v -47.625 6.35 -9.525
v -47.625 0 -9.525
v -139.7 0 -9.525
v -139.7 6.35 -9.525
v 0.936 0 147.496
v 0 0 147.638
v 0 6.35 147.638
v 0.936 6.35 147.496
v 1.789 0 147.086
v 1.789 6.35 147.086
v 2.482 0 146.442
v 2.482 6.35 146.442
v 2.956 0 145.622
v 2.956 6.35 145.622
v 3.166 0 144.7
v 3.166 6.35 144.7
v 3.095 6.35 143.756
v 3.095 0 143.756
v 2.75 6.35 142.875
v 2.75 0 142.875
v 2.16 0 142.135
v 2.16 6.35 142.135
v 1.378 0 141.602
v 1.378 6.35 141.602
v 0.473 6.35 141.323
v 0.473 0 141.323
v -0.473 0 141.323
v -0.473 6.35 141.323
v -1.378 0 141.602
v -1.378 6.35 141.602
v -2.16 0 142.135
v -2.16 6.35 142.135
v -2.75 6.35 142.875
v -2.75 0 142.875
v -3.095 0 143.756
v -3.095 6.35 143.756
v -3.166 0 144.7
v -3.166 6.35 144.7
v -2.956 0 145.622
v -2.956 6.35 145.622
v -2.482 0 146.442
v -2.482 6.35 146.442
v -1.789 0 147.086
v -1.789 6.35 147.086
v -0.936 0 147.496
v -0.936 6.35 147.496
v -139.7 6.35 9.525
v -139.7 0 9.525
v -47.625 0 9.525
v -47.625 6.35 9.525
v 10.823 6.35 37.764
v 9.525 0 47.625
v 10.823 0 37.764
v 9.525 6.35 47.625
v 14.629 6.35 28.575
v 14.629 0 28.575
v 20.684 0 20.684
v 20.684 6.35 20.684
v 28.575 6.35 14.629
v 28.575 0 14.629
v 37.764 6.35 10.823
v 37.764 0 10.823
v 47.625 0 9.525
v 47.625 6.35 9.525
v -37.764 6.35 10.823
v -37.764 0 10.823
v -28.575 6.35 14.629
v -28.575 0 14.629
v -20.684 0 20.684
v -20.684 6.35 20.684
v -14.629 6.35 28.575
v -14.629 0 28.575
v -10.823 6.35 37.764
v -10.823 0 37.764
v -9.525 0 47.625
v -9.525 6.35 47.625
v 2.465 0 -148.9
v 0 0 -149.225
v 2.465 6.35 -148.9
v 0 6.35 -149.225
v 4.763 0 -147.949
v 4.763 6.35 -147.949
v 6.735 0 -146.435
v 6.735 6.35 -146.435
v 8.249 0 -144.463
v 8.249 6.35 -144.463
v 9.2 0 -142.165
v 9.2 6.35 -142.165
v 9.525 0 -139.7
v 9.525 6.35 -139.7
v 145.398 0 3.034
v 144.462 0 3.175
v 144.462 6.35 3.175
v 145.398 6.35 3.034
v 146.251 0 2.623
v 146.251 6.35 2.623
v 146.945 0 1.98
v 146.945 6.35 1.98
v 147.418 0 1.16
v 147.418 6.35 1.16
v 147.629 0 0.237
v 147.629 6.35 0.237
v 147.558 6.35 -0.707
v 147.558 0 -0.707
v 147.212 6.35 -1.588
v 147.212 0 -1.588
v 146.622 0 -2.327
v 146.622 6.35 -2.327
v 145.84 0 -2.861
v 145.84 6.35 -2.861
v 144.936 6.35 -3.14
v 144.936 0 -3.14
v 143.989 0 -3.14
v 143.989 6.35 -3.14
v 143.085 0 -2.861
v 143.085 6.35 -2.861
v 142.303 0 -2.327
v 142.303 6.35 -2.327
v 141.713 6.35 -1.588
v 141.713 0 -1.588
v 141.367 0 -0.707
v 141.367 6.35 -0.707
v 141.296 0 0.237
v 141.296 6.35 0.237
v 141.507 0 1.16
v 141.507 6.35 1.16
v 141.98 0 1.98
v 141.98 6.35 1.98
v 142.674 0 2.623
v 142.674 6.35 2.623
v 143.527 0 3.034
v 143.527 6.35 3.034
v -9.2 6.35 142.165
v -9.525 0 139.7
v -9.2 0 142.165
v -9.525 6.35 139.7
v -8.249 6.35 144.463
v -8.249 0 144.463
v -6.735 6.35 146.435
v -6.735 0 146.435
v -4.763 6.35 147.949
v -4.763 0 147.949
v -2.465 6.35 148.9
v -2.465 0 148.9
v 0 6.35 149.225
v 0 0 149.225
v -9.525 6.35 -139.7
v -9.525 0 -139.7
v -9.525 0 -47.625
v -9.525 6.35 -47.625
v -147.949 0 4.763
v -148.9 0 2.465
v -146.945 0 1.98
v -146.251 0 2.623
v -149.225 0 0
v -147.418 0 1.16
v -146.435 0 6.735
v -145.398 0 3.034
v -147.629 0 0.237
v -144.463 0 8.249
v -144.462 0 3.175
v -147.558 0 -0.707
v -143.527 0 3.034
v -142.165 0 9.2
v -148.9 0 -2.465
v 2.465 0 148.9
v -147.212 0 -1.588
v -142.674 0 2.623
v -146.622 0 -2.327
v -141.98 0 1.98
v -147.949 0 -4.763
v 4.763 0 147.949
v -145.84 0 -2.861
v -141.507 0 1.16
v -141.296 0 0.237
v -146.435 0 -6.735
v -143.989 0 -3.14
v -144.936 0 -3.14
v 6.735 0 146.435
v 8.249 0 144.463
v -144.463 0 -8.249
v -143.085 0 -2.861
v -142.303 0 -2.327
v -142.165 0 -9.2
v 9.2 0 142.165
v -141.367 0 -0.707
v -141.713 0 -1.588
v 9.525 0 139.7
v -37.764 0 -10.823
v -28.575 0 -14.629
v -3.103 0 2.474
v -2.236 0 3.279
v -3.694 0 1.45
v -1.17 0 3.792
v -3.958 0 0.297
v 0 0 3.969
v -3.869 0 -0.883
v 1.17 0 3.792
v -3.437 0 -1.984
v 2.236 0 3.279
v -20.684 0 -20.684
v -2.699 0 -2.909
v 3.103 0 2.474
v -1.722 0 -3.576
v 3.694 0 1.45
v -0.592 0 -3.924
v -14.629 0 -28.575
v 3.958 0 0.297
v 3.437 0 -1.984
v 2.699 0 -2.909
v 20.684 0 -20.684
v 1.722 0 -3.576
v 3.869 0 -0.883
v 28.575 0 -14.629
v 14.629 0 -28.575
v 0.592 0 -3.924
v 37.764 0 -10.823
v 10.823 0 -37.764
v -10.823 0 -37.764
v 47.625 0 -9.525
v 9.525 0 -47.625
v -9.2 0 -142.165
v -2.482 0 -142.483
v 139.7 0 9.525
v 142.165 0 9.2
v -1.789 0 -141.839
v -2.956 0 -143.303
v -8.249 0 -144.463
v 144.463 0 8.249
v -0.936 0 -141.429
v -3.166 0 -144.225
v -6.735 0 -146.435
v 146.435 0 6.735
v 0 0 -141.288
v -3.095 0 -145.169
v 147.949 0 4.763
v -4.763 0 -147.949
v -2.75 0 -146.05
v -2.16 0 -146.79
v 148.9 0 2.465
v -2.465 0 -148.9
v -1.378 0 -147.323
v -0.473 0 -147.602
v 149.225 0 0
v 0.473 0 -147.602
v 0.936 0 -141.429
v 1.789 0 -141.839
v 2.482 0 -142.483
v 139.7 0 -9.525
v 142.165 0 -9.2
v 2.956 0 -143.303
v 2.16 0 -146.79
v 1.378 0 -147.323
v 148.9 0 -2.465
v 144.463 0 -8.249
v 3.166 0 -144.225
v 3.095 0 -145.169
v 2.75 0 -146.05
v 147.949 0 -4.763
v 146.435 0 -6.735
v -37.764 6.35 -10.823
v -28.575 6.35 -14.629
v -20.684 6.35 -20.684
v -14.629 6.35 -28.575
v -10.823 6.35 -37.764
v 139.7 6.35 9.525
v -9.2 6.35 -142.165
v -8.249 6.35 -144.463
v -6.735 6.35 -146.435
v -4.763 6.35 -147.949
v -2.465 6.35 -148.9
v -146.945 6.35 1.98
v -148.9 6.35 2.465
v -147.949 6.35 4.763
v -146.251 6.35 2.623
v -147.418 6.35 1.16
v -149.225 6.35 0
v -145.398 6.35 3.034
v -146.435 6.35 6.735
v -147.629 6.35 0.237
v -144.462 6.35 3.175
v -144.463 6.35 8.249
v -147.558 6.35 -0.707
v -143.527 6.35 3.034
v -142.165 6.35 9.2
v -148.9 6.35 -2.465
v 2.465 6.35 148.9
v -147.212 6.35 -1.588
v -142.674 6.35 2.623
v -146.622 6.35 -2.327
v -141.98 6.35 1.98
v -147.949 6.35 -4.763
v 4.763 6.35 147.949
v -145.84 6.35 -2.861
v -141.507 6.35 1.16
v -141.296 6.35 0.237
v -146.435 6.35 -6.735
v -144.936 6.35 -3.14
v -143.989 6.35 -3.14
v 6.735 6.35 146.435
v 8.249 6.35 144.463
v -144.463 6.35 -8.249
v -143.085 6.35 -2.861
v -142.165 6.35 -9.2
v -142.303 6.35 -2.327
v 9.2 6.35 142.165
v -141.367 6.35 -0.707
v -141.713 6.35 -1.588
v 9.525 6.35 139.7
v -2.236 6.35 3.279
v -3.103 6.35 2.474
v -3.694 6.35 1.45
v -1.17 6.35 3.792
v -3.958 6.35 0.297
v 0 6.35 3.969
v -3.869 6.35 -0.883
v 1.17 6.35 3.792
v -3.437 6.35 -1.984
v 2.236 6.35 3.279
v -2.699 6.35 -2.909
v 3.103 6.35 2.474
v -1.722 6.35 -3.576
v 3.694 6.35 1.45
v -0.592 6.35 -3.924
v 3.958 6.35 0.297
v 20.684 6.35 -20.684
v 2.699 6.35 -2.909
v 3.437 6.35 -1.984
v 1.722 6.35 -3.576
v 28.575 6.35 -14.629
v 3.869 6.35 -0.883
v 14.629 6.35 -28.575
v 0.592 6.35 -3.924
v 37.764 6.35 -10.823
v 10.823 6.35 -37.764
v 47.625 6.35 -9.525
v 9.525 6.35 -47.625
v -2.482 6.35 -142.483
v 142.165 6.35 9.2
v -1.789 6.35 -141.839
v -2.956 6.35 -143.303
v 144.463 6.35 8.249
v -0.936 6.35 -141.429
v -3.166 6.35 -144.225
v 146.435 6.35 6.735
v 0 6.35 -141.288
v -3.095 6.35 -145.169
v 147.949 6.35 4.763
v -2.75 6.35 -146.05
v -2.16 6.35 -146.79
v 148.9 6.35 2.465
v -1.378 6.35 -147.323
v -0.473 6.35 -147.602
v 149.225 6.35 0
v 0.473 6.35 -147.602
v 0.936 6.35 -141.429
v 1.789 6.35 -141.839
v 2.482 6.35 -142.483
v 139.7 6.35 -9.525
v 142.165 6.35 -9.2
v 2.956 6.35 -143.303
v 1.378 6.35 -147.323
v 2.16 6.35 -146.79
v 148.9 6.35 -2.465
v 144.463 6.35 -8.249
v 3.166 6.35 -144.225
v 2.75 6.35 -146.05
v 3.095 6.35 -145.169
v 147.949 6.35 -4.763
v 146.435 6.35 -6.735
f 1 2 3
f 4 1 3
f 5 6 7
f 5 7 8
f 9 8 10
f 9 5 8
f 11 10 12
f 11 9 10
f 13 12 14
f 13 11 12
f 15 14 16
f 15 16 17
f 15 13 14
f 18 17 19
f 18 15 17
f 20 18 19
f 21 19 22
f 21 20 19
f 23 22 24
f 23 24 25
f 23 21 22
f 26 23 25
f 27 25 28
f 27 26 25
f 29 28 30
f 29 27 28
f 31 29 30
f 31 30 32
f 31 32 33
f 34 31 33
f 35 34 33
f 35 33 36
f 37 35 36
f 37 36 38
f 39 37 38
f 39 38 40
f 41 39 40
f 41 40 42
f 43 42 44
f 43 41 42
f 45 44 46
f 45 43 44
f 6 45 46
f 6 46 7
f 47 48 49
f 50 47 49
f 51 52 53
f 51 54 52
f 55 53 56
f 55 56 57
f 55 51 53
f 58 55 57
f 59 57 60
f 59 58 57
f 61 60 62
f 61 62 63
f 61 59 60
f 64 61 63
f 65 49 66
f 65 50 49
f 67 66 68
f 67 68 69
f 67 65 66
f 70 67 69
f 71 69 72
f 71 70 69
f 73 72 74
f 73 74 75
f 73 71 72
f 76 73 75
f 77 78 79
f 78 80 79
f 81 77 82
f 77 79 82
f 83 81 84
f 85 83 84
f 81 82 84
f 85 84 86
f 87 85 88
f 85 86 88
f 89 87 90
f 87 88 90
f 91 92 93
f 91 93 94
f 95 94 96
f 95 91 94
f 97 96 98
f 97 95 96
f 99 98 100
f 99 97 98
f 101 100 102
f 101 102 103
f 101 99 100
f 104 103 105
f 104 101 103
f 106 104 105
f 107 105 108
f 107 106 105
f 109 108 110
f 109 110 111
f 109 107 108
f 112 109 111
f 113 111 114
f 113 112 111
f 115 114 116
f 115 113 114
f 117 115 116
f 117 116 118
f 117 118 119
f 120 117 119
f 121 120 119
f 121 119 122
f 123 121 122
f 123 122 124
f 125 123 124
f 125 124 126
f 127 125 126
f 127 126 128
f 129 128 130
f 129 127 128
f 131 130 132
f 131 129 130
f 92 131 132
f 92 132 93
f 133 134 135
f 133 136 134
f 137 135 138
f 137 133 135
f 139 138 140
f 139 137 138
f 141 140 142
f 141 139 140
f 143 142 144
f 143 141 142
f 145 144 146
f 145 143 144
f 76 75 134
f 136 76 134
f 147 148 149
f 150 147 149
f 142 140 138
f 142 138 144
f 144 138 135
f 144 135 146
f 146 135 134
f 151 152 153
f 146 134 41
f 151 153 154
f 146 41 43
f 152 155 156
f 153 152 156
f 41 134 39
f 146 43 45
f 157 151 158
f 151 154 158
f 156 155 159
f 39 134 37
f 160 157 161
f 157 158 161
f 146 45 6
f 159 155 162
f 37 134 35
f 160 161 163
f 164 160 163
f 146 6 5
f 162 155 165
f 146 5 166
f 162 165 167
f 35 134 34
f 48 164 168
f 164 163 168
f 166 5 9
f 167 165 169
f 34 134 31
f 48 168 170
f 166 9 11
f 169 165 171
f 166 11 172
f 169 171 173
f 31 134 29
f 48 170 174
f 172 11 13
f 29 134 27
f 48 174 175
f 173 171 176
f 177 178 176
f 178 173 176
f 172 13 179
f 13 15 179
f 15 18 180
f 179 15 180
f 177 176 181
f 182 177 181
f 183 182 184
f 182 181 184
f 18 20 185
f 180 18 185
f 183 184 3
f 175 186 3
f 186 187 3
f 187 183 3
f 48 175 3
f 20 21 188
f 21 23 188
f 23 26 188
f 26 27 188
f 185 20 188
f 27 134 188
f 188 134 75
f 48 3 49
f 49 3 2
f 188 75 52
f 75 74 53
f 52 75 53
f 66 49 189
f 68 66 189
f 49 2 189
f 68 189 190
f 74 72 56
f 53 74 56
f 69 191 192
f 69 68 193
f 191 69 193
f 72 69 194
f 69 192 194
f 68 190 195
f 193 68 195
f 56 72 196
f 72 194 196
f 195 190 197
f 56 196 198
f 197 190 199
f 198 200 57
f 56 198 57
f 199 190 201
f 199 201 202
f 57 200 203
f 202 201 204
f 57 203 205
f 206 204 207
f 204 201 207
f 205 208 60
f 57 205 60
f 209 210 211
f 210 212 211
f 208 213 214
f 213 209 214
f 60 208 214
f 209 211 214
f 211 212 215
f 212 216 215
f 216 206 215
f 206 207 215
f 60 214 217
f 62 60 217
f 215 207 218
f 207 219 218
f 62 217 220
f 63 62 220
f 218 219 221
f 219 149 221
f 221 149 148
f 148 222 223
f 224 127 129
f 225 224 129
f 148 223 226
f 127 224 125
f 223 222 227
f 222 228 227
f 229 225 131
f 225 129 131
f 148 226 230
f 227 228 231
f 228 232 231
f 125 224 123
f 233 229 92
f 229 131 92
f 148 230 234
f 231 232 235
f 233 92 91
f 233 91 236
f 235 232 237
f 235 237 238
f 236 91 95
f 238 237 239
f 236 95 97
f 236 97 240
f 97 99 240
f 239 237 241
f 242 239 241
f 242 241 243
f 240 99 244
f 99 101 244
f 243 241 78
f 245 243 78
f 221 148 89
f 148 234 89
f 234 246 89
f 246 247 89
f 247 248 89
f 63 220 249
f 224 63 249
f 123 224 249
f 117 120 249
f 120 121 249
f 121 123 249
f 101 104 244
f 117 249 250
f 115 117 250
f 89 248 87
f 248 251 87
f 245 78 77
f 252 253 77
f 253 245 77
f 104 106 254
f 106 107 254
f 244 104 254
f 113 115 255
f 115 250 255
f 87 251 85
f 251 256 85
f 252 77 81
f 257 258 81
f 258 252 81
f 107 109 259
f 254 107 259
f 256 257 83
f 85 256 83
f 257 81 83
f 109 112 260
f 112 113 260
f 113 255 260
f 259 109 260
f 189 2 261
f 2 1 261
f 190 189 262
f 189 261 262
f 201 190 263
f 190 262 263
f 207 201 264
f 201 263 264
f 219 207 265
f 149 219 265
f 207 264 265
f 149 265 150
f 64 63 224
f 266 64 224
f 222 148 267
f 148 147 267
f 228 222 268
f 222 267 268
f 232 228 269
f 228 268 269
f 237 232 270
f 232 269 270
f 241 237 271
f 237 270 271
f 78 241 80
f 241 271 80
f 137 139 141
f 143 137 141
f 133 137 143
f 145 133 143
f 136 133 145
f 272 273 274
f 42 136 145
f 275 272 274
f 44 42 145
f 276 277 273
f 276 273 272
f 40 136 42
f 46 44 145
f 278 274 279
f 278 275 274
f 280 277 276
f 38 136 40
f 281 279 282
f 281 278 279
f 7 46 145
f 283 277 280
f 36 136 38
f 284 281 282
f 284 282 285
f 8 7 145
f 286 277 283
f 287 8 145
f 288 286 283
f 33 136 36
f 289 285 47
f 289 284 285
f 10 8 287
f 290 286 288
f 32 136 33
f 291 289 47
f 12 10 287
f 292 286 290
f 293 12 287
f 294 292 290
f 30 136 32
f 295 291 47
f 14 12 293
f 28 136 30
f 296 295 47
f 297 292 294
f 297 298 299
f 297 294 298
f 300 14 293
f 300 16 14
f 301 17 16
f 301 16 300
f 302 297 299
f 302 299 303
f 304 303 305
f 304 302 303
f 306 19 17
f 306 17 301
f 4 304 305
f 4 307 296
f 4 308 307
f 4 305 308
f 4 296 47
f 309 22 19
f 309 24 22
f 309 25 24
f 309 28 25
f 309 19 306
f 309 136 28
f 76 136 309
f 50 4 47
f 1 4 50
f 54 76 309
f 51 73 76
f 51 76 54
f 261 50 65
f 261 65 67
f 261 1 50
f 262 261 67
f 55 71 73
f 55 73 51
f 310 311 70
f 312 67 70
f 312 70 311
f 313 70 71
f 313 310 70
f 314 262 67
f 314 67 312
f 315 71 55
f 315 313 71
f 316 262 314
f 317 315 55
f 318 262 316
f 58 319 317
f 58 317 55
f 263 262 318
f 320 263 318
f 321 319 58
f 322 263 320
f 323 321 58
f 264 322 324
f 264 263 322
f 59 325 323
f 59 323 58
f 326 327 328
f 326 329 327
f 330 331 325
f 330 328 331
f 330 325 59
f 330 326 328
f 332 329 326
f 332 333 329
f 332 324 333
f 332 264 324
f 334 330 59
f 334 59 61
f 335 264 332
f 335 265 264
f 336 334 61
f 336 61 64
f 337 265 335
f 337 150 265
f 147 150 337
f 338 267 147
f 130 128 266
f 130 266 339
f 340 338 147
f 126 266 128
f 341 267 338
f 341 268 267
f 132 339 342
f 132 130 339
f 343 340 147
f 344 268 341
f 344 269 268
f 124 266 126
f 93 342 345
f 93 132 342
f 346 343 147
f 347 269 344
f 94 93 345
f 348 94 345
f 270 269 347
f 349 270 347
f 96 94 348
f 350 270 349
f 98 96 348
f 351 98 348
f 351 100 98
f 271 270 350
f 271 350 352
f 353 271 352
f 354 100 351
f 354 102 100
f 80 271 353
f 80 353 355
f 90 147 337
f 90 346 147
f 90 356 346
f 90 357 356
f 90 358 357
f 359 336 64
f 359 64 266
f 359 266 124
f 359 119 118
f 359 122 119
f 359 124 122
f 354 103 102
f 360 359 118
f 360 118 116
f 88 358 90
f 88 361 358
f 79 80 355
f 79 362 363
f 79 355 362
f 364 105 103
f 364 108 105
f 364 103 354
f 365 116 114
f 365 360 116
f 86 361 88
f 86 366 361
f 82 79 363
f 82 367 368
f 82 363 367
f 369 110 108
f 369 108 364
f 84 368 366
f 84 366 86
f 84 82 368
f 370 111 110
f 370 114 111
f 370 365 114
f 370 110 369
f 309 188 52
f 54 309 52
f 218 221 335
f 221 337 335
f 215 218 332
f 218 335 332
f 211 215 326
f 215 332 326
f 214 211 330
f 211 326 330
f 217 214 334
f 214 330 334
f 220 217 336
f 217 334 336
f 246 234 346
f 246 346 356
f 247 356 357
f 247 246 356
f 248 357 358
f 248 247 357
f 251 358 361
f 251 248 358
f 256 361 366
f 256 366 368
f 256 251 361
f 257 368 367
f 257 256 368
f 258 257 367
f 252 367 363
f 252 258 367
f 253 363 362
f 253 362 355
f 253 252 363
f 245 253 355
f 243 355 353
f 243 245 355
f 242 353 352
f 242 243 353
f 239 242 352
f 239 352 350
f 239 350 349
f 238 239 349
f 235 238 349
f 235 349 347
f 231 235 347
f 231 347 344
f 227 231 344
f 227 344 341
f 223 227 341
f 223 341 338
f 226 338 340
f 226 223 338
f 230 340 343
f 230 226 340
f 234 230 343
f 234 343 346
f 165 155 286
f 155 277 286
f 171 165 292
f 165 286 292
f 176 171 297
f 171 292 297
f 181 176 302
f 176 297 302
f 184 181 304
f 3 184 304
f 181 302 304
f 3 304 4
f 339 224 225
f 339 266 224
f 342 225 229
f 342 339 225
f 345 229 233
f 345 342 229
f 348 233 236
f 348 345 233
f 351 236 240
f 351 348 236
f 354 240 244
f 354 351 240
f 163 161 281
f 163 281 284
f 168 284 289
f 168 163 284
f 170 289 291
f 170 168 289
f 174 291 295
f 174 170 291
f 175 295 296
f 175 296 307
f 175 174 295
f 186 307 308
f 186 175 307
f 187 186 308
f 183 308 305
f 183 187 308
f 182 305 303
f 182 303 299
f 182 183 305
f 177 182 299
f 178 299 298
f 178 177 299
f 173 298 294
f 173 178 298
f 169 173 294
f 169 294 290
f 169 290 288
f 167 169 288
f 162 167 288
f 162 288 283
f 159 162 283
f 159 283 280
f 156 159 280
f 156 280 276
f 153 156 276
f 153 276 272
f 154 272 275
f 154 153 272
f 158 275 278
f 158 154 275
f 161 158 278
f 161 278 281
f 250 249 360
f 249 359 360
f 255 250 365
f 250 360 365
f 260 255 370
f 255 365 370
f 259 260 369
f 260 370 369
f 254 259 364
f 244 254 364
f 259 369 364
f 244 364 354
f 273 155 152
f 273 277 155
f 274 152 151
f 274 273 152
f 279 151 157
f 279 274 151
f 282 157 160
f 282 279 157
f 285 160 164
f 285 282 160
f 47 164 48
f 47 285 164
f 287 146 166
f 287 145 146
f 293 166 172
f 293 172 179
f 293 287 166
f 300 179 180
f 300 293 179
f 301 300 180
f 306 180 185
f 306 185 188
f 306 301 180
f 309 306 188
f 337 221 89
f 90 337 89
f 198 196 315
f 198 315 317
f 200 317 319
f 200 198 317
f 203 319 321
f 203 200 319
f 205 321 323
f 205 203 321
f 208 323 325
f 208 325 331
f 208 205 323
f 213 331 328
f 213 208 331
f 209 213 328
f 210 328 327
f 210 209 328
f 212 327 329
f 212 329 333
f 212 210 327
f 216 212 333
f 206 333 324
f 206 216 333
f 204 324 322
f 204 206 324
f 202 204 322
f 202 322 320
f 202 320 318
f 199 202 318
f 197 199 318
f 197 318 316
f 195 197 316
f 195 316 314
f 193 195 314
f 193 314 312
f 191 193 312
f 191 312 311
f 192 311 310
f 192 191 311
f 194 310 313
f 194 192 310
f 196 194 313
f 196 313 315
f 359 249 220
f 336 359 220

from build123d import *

# Parameters (mm, degrees)
SKETCH2_R           = 3.175
SKETCH2_R_2         = 3.96875
BOSS_EXTRUDE1_DEPTH = 6.35
FILLET1_R           = 9.525
FILLET3_R           = 38.1


with BuildPart() as part:
    # Sketch2 → Boss-Extrude1 (new body)
    with BuildSketch(Plane(origin=(0, 0, 0), x_dir=(1, 0, 0), z_dir=(0, 1, 0))):
        with BuildLine():
            ThreePointArc((-148.920700374, 9.525), (-149.225, 0), (-148.920700374, -9.525))
            Line((-148.920700374, -9.525), (-9.525, -9.525))
            Line((-9.525, -9.525), (-9.525, -148.920700374))
            ThreePointArc((-9.525, -148.920700374), (0, -149.225), (9.525, -148.920700374))
            Line((9.525, -148.920700374), (9.525, -9.525))
            Line((9.525, -9.525), (148.920700374, -9.525))
            ThreePointArc((148.920700374, -9.525), (149.148905692, -4.764929781), (149.225, 0))
            ThreePointArc((149.225, 0), (149.148905692, 4.764929781), (148.920700374, 9.525))
            Line((148.920700374, 9.525), (9.525, 9.525))
            Line((9.525, 9.525), (9.525, 148.920700374))
            ThreePointArc((9.525, 148.920700374), (0, 149.225), (-9.525, 148.920700374))
            Line((-9.525, 148.920700374), (-9.525, 9.525))
            Line((-9.525, 9.525), (-148.920700374, 9.525))
        make_face()
        with Locations(Location((-144.4625, 0, 0), (0, 0, 270))):
            Circle(SKETCH2_R, mode=Mode.SUBTRACT)
        with Locations(Location((0, -144.4625, 0), (0, 0, 270))):
            Circle(SKETCH2_R, mode=Mode.SUBTRACT)
        with Locations(Location((144.4625, 0, 0), (0, 0, 270))):
            Circle(SKETCH2_R, mode=Mode.SUBTRACT)
        with Locations(Location((0, 144.4625, 0), (0, 0, 270))):
            Circle(SKETCH2_R, mode=Mode.SUBTRACT)
        with Locations(Location((0, 0, 0), (0, 0, 270))):
            Circle(SKETCH2_R_2, mode=Mode.SUBTRACT)
    extrude(amount=BOSS_EXTRUDE1_DEPTH)

    # Fillet1
    fillet1_edges = [part.edges().sort_by_distance(p)[0] for p in [
        (-9.525, 3.175, -148.920700374),
        (9.525, 3.175, -148.920700374),
        (148.920700374, 3.175, -9.525),
        (148.920700374, 3.175, 9.525),
        (9.525, 3.175, 148.920700374),
        (-9.525, 3.175, 148.920700374),
        (-148.920700374, 3.175, -9.525),
        (-148.920700374, 3.175, 9.525),
    ]]
    fillet(fillet1_edges, radius=FILLET1_R - 0.0001)  # a hair under: the kernel refuses the full size

    # Fillet3
    fillet3_edges = [part.edges().sort_by_distance(p)[0] for p in [
        (9.525, 3.175, 9.525),
        (-9.525, 3.175, 9.525),
        (-9.525, 3.175, -9.525),
        (9.525, 3.175, -9.525),
    ]]
    fillet(fillet3_edges, radius=FILLET3_R)


solid = part.part
